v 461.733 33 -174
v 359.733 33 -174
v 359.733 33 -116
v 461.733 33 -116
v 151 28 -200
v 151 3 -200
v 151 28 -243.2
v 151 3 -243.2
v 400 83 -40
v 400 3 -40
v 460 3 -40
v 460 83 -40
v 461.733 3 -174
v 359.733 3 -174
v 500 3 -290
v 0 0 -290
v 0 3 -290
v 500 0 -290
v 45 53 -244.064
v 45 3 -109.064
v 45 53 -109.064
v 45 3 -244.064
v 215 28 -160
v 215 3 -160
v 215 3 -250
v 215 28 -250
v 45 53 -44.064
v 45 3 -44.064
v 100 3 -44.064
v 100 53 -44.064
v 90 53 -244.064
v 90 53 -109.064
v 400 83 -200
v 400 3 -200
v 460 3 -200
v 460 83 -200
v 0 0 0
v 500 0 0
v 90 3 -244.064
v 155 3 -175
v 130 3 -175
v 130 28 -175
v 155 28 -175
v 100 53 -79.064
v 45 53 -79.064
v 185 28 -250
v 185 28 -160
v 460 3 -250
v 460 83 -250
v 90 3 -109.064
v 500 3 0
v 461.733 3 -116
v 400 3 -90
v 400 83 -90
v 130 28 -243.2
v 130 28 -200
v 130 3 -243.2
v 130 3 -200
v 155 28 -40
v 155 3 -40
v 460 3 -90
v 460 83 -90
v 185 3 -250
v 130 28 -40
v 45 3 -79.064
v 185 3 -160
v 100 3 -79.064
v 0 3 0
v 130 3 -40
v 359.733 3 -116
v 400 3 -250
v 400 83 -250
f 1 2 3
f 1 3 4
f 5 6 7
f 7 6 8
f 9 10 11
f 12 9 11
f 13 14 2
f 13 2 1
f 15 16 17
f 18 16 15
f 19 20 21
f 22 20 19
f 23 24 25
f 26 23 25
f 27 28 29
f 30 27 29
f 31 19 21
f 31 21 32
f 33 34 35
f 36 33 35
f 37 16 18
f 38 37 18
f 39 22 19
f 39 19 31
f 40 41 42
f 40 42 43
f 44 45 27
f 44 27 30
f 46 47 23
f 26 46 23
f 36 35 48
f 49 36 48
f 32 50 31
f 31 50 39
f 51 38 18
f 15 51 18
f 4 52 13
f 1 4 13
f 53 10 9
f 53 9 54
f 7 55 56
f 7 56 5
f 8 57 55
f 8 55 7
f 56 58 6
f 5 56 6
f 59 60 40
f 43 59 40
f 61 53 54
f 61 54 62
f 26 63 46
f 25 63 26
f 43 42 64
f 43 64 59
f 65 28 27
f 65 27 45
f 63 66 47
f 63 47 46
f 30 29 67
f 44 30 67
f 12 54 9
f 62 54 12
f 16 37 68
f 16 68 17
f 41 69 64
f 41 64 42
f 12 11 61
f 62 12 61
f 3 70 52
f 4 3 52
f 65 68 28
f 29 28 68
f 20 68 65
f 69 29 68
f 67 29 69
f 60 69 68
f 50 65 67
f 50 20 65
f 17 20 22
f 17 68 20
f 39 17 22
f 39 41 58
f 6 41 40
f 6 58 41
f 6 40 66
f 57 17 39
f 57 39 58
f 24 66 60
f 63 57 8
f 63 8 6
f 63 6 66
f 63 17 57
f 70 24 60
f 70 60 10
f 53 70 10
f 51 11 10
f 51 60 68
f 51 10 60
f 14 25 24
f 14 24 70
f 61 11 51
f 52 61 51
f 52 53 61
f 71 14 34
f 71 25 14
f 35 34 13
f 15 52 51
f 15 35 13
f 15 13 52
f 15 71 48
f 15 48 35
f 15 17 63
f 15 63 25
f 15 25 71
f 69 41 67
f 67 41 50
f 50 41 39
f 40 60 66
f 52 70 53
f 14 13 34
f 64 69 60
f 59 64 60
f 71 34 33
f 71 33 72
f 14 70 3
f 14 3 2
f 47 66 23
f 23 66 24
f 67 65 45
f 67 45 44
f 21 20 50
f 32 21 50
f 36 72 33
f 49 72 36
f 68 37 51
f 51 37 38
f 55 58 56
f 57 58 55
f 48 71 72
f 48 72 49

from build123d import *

# Parameters (mm, degrees)
SKETCH1_W           = 500
SKETCH1_H           = 290
BOSS_EXTRUDE1_DEPTH = 3
SKETCH3_W           = 60
SKETCH3_H           = 50
BOSS_EXTRUDE2_DEPTH = 80
SKETCH4_W           = 102
SKETCH4_H           = 58
BOSS_EXTRUDE3_DEPTH = 30
SKETCH5_W           = 30
SKETCH5_H           = 90
SKETCH5_W_2         = 21
SKETCH5_H_2         = 43.2
SKETCH5_W_3         = 25
SKETCH5_H_3         = 135
BOSS_EXTRUDE4_DEPTH = 25
SKETCH6_W           = 55
SKETCH6_H           = 35
SKETCH6_W_2         = 45
SKETCH6_H_2         = 135
BOSS_EXTRUDE5_DEPTH = 50


with BuildPart() as part:
    # Sketch1 → Boss-Extrude1 (new body)
    with BuildSketch(Plane(origin=(0, 0, 0), x_dir=(1, 0, 0), z_dir=(0, 1, 0))):
        with Locations((250, 145)):
            Rectangle(SKETCH1_W, SKETCH1_H)
    extrude(amount=BOSS_EXTRUDE1_DEPTH)

    # Sketch3 → Boss-Extrude2 (add)
    with BuildSketch(Plane(origin=(0, 3, 0), x_dir=(1, 0, 0), z_dir=(0, 1, 0))):
        with Locations((430, 225)):
            Rectangle(SKETCH3_W, SKETCH3_H)
        with Locations((430, 65)):
            Rectangle(SKETCH3_W, SKETCH3_H)
    extrude(amount=BOSS_EXTRUDE2_DEPTH)

    # Sketch4 → Boss-Extrude3 (add)
    with BuildSketch(Plane(origin=(0, 3, 0), x_dir=(1, 0, 0), z_dir=(0, 1, 0))):
        with Locations((410.73324546, 145)):
            Rectangle(SKETCH4_W, SKETCH4_H)
    extrude(amount=BOSS_EXTRUDE3_DEPTH)

    # Sketch5 → Boss-Extrude4 (add)
    with BuildSketch(Plane(origin=(0, 3, 0), x_dir=(1, 0, 0), z_dir=(0, 1, 0))):
        with Locations((200, 205)):
            Rectangle(SKETCH5_W, SKETCH5_H)
        with Locations((140.5, 221.6)):
            Rectangle(SKETCH5_W_2, SKETCH5_H_2)
        with Locations((142.5, 107.5)):
            Rectangle(SKETCH5_W_3, SKETCH5_H_3)
    extrude(amount=BOSS_EXTRUDE4_DEPTH)

    # Sketch6 → Boss-Extrude5 (add)
    with BuildSketch(Plane(origin=(0, 3, 0), x_dir=(1, 0, 0), z_dir=(0, 1, 0))):
        with Locations((72.5, 61.564484871)):
            Rectangle(SKETCH6_W, SKETCH6_H)
        with Locations((67.5, 176.564484871)):
            Rectangle(SKETCH6_W_2, SKETCH6_H_2)
    extrude(amount=BOSS_EXTRUDE5_DEPTH)


solid = part.part
